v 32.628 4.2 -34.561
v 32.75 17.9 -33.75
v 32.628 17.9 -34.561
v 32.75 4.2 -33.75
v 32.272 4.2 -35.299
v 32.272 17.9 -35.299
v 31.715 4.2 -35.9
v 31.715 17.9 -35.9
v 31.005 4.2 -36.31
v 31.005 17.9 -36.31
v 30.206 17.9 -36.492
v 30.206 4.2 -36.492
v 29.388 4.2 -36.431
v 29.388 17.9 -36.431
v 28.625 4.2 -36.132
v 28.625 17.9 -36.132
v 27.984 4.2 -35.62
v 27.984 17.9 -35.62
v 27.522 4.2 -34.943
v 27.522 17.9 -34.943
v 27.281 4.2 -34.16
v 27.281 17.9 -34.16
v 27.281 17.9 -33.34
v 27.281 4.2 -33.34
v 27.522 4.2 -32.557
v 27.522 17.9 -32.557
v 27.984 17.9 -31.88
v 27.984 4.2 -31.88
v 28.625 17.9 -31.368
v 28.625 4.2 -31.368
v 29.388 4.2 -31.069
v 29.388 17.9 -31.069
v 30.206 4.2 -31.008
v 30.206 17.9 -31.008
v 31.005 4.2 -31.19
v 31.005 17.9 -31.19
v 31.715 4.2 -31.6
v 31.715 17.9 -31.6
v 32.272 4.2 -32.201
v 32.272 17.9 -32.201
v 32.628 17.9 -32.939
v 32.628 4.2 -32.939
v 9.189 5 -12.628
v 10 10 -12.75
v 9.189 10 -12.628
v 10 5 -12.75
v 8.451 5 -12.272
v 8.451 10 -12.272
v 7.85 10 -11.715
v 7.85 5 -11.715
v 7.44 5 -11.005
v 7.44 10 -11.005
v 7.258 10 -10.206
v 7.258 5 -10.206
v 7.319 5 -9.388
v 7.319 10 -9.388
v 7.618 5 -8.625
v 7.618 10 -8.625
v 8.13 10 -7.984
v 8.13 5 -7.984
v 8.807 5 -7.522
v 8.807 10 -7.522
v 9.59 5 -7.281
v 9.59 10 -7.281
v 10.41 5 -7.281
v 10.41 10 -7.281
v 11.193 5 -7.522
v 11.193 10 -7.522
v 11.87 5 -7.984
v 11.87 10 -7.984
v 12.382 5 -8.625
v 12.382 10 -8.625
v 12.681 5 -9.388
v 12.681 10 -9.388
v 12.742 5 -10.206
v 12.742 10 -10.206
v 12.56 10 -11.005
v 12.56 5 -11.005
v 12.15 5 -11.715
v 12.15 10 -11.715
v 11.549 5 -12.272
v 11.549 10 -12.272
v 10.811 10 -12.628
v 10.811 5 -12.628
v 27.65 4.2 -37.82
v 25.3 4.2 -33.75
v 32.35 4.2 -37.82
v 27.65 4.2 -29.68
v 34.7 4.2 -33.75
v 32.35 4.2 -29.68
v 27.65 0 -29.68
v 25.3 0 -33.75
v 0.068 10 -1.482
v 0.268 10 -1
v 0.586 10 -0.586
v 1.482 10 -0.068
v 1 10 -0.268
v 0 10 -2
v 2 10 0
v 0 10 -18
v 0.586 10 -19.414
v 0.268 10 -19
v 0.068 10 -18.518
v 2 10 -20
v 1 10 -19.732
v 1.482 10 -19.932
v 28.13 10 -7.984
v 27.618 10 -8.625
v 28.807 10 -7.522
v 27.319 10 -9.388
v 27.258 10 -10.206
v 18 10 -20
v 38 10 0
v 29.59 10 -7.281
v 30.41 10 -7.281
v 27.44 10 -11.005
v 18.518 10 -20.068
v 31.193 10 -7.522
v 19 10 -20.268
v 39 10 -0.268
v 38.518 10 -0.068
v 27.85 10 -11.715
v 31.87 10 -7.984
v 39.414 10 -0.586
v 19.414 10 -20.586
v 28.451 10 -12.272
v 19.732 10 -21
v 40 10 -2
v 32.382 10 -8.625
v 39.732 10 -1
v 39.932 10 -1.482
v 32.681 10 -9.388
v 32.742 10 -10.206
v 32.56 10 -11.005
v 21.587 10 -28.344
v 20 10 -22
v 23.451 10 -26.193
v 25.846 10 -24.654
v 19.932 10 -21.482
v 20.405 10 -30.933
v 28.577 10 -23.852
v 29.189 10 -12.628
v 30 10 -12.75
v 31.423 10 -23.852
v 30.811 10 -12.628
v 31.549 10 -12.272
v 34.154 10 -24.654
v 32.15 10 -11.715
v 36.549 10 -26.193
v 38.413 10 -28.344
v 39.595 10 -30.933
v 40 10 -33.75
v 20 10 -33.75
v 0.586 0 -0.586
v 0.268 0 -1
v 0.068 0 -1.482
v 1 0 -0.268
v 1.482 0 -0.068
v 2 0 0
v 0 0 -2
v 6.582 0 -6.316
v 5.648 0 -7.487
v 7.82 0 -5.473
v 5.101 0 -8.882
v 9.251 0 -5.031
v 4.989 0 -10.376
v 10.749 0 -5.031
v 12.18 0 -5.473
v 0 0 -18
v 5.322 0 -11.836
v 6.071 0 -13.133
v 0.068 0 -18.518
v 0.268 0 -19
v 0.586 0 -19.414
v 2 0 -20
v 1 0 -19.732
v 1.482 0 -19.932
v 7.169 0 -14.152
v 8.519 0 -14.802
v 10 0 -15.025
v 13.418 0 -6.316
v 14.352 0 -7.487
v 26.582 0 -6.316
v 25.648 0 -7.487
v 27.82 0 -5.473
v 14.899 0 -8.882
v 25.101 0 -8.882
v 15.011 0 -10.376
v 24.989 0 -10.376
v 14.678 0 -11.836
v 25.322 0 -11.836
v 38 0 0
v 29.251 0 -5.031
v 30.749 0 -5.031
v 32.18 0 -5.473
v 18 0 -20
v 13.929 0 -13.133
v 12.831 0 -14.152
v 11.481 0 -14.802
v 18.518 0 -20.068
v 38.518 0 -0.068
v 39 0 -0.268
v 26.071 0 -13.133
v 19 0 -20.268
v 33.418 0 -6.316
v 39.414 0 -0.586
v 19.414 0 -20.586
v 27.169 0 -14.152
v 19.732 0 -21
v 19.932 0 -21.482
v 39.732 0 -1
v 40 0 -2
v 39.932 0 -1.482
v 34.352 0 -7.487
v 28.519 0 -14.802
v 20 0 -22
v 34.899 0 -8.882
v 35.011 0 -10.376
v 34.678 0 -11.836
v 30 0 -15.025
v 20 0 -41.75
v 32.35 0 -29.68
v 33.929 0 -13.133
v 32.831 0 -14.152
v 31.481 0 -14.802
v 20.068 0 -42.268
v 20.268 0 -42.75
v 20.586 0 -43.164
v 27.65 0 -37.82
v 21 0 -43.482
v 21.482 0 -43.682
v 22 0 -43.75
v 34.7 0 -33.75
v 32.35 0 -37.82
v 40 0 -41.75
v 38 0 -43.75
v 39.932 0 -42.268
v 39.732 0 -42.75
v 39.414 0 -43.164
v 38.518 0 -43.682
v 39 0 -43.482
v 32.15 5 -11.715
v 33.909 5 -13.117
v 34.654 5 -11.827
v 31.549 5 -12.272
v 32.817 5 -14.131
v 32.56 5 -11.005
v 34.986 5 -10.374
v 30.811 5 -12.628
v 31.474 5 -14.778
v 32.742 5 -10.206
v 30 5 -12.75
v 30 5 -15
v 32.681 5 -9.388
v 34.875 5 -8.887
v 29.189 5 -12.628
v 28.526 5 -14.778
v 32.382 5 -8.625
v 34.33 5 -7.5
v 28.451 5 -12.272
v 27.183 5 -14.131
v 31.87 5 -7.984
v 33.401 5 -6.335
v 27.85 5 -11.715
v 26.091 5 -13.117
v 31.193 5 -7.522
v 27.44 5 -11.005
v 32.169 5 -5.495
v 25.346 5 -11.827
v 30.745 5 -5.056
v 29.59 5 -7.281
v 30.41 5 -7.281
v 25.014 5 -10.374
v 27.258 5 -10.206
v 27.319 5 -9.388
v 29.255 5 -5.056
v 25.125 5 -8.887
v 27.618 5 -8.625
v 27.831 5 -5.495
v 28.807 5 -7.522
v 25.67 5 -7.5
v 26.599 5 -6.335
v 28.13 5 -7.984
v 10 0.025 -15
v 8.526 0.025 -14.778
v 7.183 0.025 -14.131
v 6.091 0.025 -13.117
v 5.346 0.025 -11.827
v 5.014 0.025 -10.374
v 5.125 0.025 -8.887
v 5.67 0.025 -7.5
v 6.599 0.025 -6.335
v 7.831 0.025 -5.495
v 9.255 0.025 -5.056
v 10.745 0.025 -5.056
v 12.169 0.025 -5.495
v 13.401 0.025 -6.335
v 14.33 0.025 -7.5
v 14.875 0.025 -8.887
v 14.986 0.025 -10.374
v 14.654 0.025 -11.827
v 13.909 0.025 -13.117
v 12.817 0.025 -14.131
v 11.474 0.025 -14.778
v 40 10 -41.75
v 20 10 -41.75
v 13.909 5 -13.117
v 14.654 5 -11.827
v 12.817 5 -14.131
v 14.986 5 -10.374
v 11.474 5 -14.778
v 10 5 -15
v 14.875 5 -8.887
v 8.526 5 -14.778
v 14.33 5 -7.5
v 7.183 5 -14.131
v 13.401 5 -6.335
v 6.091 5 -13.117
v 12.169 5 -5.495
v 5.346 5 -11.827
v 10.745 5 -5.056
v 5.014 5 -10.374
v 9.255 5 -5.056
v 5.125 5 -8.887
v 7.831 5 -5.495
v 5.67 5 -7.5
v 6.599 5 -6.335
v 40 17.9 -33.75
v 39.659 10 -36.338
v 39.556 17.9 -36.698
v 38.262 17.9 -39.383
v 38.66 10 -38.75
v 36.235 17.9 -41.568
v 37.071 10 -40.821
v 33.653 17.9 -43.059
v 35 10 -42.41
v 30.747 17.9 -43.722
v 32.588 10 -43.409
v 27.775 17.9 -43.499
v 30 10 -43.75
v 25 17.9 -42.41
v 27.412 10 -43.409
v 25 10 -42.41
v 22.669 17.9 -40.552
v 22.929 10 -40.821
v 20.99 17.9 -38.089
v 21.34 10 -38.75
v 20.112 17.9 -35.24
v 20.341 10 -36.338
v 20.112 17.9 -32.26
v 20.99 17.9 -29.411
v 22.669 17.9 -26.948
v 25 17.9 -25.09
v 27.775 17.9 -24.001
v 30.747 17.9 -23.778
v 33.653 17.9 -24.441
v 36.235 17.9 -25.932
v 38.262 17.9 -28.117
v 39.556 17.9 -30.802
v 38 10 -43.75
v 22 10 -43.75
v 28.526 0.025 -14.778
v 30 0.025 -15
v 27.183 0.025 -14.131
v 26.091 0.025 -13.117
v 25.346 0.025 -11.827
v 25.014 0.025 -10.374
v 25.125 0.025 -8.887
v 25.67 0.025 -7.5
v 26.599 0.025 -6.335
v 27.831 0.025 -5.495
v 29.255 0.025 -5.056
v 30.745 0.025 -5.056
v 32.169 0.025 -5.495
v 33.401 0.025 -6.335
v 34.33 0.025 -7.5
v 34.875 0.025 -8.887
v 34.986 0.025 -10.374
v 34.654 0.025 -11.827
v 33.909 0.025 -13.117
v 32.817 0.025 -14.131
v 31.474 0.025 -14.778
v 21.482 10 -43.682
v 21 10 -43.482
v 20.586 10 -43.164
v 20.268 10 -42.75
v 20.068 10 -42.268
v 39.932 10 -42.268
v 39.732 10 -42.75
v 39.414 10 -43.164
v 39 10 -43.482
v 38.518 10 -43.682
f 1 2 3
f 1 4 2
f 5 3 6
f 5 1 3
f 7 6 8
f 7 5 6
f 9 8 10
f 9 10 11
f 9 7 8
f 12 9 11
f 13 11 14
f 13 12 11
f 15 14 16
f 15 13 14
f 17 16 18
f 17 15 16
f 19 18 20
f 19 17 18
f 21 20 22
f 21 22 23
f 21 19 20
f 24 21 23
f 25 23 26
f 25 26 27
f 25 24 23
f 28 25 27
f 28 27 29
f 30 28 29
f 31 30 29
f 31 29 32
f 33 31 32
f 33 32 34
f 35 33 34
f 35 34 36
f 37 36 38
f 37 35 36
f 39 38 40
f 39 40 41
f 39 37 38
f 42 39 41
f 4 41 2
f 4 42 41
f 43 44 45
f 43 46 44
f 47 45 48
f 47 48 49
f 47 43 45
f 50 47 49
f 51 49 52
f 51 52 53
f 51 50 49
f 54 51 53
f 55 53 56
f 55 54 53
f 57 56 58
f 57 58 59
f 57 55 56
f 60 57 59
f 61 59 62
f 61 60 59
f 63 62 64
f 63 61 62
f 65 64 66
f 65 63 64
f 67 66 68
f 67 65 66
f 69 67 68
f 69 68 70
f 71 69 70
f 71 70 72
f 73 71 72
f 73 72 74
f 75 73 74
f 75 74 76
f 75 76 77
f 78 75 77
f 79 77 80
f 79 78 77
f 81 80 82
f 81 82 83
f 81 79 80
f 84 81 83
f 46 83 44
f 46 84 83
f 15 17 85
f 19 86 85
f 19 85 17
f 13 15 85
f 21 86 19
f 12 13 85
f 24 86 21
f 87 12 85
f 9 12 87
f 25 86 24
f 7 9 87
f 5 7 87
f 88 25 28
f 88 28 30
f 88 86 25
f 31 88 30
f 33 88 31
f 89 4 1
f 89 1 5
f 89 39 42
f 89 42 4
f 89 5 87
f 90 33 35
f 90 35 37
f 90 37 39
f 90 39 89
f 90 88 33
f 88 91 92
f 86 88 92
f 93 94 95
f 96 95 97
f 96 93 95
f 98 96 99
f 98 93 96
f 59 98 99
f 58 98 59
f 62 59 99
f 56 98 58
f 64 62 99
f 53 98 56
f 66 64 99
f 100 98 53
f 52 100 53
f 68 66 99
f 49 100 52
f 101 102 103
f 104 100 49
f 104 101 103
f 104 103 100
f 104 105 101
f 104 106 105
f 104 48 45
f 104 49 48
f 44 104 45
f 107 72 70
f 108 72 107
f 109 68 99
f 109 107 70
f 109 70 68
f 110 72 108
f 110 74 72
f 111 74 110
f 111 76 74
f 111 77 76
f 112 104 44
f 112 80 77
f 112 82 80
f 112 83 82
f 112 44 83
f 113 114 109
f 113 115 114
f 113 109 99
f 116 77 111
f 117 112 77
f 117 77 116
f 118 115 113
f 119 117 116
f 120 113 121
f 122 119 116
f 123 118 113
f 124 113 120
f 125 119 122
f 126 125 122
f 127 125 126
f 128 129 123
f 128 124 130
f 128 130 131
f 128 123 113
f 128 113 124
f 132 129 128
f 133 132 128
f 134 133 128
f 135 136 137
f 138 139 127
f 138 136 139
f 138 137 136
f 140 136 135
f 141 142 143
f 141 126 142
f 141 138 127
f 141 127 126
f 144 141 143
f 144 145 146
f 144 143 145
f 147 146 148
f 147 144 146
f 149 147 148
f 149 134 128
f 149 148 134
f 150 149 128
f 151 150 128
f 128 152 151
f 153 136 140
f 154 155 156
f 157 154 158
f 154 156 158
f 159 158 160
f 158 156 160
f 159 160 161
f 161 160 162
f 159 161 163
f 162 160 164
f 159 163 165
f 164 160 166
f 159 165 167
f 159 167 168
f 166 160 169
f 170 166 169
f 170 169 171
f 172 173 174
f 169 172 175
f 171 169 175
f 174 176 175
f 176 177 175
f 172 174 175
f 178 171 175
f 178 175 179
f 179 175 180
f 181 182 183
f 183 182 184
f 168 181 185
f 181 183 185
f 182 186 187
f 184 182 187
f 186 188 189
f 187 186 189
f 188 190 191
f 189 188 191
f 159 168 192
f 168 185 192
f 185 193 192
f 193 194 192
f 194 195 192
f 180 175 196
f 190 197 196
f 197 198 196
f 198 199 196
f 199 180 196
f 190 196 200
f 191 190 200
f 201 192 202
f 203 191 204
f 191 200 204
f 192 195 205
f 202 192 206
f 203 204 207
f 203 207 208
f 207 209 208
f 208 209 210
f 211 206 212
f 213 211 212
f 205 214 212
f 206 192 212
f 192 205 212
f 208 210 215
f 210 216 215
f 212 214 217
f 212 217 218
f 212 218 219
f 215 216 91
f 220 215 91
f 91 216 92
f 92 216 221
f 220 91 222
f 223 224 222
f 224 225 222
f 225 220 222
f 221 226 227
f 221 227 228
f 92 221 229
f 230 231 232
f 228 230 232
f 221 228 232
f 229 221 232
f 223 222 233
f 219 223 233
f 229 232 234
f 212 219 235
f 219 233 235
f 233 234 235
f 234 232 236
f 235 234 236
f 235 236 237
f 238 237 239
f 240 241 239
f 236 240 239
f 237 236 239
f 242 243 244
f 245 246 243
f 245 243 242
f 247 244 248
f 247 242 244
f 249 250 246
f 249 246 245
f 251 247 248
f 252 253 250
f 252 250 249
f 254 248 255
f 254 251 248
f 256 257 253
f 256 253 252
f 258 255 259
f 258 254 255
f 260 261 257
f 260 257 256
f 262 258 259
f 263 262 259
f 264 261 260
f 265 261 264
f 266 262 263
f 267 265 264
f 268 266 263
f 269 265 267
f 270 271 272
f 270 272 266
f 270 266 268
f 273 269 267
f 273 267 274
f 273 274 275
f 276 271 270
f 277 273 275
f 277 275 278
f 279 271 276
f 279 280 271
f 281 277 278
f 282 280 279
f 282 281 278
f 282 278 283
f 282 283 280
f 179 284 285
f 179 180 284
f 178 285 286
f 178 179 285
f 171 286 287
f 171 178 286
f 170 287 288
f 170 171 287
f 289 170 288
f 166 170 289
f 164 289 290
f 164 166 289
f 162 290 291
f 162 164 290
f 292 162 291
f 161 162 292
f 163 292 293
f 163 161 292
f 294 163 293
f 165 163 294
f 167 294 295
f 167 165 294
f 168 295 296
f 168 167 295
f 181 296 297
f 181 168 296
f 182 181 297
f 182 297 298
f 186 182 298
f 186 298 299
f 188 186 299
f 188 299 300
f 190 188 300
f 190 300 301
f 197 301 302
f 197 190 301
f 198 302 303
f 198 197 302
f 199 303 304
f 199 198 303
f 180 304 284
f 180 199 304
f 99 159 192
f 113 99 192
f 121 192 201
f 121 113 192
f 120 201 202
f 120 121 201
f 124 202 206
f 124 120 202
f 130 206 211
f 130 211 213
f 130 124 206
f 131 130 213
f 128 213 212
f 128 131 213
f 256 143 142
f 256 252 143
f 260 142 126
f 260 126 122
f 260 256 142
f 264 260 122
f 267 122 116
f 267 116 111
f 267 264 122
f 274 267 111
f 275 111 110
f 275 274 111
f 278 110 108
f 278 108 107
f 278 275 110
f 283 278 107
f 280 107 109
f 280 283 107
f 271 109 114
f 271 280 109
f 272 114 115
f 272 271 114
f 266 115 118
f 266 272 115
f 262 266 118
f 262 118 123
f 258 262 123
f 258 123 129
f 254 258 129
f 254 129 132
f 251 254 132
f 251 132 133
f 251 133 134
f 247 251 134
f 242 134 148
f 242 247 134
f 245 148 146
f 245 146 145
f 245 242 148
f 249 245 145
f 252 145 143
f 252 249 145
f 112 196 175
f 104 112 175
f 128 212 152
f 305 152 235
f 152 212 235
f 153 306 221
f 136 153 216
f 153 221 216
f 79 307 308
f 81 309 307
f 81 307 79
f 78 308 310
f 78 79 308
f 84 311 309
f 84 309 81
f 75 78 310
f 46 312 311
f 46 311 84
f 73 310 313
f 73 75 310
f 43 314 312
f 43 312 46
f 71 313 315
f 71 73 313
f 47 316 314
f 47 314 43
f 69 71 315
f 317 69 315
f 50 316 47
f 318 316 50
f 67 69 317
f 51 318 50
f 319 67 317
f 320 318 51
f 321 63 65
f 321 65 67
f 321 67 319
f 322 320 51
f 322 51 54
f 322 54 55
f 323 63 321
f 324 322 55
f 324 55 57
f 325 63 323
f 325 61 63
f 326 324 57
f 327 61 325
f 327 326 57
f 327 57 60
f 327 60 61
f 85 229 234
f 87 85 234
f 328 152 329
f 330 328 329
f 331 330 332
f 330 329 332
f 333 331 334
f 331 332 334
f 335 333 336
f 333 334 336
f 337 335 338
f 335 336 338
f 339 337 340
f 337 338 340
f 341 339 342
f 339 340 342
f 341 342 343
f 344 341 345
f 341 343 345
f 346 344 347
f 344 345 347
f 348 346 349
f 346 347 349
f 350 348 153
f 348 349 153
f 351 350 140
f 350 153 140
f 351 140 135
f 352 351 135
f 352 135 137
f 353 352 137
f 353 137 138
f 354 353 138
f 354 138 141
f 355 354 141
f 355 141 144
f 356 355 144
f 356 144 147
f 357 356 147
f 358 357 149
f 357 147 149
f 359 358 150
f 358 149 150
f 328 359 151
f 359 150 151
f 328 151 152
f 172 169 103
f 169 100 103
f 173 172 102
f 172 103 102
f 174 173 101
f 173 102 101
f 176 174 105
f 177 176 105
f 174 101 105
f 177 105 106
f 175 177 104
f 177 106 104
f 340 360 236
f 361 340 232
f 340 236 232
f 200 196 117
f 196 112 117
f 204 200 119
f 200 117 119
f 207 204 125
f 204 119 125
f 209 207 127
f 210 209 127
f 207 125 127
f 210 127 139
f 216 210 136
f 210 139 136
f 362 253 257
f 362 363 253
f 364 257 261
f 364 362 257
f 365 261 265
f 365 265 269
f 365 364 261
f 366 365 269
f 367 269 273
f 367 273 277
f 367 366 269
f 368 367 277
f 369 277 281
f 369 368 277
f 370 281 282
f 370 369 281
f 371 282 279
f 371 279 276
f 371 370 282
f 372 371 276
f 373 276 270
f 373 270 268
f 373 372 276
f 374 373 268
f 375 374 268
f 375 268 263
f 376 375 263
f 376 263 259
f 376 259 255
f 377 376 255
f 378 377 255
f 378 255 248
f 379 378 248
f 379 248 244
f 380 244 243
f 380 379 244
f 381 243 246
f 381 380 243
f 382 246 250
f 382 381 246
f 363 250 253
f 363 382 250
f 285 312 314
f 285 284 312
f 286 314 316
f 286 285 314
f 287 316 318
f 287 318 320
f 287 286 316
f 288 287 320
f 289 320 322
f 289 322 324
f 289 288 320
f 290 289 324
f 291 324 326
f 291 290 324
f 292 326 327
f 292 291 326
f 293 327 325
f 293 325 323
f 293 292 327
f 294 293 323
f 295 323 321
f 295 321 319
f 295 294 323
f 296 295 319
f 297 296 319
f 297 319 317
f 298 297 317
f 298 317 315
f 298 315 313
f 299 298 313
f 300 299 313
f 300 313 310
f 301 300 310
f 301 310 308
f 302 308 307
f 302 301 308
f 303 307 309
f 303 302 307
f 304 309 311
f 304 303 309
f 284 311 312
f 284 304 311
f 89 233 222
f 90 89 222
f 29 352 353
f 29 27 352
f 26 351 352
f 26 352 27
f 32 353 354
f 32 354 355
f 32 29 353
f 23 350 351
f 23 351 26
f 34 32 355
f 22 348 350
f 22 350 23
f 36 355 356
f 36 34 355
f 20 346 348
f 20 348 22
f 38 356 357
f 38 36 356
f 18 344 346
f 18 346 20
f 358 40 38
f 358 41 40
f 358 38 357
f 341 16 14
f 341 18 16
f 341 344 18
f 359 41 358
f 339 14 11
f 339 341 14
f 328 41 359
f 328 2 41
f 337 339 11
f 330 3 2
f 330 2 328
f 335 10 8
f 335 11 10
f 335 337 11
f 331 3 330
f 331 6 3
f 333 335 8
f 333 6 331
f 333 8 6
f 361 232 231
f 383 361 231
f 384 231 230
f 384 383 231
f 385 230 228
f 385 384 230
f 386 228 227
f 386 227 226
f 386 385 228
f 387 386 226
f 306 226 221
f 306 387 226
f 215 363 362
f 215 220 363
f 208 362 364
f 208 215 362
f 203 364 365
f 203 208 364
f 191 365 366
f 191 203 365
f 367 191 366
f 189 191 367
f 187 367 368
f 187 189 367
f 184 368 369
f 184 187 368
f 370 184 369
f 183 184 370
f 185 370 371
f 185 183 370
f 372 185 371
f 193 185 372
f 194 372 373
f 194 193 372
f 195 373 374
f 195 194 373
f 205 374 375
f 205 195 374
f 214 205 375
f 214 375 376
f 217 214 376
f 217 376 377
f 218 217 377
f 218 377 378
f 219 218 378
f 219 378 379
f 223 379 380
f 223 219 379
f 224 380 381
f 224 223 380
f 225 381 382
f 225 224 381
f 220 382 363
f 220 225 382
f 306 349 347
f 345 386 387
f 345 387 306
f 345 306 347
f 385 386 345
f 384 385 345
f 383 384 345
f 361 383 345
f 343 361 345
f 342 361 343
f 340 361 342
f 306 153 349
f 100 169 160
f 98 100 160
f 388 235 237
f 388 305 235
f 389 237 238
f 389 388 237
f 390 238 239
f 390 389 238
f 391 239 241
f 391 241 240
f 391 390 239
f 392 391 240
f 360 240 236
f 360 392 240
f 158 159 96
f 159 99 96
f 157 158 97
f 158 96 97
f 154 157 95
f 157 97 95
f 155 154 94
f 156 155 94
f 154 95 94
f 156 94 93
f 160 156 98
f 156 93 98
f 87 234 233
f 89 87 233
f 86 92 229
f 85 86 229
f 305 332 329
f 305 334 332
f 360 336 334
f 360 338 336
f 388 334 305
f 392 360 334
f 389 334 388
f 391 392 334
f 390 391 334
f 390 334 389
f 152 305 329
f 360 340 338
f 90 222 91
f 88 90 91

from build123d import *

# Parameters (mm, degrees)
BOSS_EXTRUDE1_DEPTH            = 10
CBORE_FOR_M5_SHCS1_AT_2_COUNT  = 2
CBORE_FOR_M5_SHCS1_AT_2_PITCH  = 20
FILLET1_R                      = 2
CUT_EXTRUDE1_DEPTH             = 4.2
M5_CLEARANCE_HOLE1_D           = 5.5
M5_CLEARANCE_HOLE1_CSINK_D     = 5.55
M5_CLEARANCE_HOLE1_CSINK_ANGLE = 90
SKETCH9_R                      = 10
SKETCH9_R_2                    = 2.75
BOSS_EXTRUDE2_DEPTH            = 7.9


with BuildPart() as part:
    # Sketch1 → Boss-Extrude1 (new body)
    with BuildSketch(Plane(origin=(0, 0, 0), x_dir=(1, 0, 0), z_dir=(0, 1, 0))):
        Polygon((0, 0), (40, 0), (40, 43.75), (20, 43.75), (20, 20), (0, 20), align=None)
    extrude(amount=BOSS_EXTRUDE1_DEPTH)

    # Sketch4 → CBORE for M5 SHCS1 (revolve, cut)
    with BuildSketch(Plane(origin=(10, 0, -10), x_dir=(0, 0, -1), z_dir=(1, 0, 0))):
        Polygon((0, 0), (0, 10), (2.75, 10), (2.75, 5), (5, 5), (5, 0.025), (5.025, 0), align=None)
    cbore_for_m5_shcs1 = revolve(axis=Axis((10, -6.35, -10), (0, 1, 0)), mode=Mode.SUBTRACT)

    # CBORE for M5 SHCS1 at 2: CBORE for M5 SHCS1 ×2
    with Locations(*[(i * CBORE_FOR_M5_SHCS1_AT_2_PITCH, 0, 0) for i in range(1, CBORE_FOR_M5_SHCS1_AT_2_COUNT)]):
        add(cbore_for_m5_shcs1, mode=Mode.SUBTRACT)

    # Fillet1
    fillet1_edges = [part.edges().sort_by_distance(p)[0] for p in [
        (0, 5, -20),
        (20, 5, -20),
        (20, 5, -43.75),
        (40, 5, -43.75),
        (40, 5, 0),
        (0, 5, 0),
    ]]
    fillet(fillet1_edges, radius=FILLET1_R)

    # Sketch6 → Cut-Extrude1 (cut)
    with BuildSketch(Plane.XZ):
        Polygon((34.7, -33.75), (32.35, -29.679680602), (27.65, -29.679680602), (25.3, -33.75), (27.65, -37.820319398), (32.35, -37.820319398), align=None)
    extrude(amount=-CUT_EXTRUDE1_DEPTH, mode=Mode.SUBTRACT)

    # M5 Clearance Hole1 (through all)
    with Locations(Plane(origin=(0, 0, 0), x_dir=(-1, 0, 0), z_dir=(0, -1, 0))):
        with Locations((-30, 33.75)):
            CounterSinkHole(M5_CLEARANCE_HOLE1_D / 2, M5_CLEARANCE_HOLE1_CSINK_D / 2, counter_sink_angle=M5_CLEARANCE_HOLE1_CSINK_ANGLE)

    # Sketch9 → Boss-Extrude2 (add)
    with BuildSketch(Plane(origin=(0, 10, 0), x_dir=(1, 0, 0), z_dir=(0, 1, 0))):
        with Locations((30, 33.75)):
            Circle(SKETCH9_R)
        with Locations((30, 33.75)):
            Circle(SKETCH9_R_2, mode=Mode.SUBTRACT)
    extrude(amount=BOSS_EXTRUDE2_DEPTH)


solid = part.part
